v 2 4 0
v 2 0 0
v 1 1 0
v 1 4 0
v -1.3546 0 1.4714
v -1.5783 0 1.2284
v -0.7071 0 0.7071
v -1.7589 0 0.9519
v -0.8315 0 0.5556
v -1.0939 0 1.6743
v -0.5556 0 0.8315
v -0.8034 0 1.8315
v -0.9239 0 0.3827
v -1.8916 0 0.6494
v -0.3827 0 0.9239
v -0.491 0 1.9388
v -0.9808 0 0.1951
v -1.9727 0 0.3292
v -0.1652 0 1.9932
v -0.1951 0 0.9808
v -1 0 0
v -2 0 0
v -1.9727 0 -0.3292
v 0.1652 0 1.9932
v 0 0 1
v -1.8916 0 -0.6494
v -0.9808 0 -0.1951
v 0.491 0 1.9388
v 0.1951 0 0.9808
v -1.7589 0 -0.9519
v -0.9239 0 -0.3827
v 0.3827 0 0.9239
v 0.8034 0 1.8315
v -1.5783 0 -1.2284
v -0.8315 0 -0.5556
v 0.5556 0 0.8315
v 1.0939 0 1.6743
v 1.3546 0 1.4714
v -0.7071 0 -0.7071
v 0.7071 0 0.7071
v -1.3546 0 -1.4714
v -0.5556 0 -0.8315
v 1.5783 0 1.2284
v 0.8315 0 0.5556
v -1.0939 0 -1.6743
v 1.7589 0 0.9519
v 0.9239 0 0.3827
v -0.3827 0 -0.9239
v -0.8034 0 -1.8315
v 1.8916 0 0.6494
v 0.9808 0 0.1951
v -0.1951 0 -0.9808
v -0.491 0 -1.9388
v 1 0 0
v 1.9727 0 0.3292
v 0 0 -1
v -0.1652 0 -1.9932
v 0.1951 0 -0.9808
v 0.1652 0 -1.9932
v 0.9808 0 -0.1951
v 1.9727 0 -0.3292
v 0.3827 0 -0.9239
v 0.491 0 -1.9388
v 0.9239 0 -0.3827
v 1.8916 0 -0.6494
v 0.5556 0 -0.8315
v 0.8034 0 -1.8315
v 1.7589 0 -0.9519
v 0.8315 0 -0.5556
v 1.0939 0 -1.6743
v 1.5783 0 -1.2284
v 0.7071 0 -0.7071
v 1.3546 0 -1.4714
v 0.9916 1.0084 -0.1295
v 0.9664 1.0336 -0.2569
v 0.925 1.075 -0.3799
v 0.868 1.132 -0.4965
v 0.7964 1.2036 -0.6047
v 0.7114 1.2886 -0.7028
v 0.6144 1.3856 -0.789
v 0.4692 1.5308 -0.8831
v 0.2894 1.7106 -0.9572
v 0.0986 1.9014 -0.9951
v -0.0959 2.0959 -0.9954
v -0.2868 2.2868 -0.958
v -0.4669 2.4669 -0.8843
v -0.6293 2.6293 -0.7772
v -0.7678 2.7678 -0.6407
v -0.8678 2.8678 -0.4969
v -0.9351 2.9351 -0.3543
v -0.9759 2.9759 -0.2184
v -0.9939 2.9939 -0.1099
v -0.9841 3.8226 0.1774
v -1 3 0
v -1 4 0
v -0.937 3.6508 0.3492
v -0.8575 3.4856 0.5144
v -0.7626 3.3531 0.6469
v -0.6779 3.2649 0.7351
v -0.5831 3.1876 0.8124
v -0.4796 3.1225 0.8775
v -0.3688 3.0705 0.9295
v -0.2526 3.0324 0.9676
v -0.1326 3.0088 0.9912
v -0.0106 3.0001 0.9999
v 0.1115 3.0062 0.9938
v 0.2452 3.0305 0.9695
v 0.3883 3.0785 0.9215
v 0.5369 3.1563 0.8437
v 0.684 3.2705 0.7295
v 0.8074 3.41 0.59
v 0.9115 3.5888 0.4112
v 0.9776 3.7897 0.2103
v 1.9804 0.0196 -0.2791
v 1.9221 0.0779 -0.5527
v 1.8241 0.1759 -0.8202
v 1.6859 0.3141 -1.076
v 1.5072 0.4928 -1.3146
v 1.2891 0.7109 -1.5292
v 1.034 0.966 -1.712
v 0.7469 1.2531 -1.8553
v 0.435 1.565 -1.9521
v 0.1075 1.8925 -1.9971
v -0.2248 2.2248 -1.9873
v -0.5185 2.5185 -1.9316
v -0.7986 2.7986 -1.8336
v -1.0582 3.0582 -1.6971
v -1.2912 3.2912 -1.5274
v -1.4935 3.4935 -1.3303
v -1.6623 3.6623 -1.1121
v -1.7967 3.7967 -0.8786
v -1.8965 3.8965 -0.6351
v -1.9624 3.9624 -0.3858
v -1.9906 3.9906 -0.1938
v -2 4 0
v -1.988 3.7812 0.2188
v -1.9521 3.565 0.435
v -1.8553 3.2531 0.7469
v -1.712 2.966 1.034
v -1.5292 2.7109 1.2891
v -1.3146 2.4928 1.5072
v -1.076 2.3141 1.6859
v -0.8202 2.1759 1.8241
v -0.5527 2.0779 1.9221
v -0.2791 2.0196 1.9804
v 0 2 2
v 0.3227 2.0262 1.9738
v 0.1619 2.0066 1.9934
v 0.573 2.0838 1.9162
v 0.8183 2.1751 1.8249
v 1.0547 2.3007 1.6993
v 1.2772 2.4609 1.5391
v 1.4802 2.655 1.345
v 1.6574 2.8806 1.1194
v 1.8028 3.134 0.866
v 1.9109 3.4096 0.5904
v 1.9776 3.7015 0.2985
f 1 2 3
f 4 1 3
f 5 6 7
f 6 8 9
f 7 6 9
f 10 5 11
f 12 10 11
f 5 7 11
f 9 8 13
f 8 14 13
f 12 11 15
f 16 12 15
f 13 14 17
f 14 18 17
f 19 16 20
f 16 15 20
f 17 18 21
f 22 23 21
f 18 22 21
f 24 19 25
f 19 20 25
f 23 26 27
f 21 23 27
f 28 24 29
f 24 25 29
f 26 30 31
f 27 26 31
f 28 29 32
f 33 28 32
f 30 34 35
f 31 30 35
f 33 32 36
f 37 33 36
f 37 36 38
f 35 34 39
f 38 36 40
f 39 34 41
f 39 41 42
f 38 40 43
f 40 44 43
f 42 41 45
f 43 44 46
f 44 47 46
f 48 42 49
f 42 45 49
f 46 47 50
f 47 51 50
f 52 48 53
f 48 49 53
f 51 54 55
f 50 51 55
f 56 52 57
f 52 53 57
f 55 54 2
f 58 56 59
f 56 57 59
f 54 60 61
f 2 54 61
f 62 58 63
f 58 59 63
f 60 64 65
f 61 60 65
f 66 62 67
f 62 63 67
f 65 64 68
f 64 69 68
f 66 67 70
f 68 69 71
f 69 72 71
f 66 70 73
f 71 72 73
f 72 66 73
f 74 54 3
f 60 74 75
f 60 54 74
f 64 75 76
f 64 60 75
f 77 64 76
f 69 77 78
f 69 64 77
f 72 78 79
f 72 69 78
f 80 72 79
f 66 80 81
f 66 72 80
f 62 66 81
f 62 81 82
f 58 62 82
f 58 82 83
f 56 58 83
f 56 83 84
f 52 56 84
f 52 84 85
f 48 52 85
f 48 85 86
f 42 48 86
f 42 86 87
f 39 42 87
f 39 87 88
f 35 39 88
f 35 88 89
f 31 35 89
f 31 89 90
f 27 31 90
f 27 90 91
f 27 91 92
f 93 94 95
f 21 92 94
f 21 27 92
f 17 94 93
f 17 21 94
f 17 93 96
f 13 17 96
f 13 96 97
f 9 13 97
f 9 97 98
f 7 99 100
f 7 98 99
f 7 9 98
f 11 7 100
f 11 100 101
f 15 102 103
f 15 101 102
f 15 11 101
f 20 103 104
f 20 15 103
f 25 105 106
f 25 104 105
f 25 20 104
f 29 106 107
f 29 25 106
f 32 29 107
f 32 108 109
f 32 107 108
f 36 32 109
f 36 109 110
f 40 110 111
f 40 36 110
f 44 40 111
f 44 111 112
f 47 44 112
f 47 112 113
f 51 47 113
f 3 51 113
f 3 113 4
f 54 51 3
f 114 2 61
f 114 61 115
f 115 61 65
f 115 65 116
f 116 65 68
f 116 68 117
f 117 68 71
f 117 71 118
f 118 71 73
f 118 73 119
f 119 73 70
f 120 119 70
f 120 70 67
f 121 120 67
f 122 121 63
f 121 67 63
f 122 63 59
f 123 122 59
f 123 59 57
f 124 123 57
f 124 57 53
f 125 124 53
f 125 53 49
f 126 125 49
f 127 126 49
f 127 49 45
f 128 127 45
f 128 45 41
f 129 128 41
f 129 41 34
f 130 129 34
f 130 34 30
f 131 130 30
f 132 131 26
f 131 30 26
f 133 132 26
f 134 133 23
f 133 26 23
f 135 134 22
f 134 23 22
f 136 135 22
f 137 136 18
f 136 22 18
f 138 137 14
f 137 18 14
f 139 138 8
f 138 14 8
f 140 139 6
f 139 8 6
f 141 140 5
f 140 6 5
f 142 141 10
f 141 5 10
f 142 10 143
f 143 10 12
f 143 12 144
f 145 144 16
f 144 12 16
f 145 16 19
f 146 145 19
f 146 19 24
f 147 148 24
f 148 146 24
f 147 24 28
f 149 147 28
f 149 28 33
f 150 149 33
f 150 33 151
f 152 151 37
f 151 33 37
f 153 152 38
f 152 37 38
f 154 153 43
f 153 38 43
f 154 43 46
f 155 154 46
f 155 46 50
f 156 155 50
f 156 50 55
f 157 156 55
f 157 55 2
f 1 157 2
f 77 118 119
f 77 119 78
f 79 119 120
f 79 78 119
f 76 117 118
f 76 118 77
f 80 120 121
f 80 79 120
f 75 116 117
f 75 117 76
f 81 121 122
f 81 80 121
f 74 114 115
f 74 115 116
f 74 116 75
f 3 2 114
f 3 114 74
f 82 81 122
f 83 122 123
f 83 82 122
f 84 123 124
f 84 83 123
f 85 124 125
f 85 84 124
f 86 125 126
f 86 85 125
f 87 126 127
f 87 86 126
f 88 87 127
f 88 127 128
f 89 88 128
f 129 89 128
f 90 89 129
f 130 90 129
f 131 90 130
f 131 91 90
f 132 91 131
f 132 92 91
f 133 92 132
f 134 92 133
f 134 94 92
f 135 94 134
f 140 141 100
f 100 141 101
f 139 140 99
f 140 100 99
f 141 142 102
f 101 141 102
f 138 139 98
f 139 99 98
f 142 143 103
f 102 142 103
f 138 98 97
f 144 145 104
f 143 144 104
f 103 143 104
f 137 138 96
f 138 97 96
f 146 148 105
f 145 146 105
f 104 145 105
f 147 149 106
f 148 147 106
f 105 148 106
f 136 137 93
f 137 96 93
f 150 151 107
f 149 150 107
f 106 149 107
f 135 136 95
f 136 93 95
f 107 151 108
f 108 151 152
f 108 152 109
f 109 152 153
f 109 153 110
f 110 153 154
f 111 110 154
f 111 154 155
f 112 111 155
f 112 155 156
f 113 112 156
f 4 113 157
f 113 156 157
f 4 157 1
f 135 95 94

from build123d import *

# Parameters (mm, degrees)
SKETCH1_R           = 2
SKETCH1_R_2         = 1
BOSS_EXTRUDE1_DEPTH = 4
CUT_EXTRUDE1_DEPTH  = 2
CUT_EXTRUDE2_DEPTH  = 10


with BuildPart() as part:
    # Sketch1 → Boss-Extrude1 (new body)
    with BuildSketch(Plane(origin=(0, 0, 0), x_dir=(1, 0, 0), z_dir=(0, 1, 0))):
        Circle(SKETCH1_R)
        Circle(SKETCH1_R_2, mode=Mode.SUBTRACT)
    extrude(amount=BOSS_EXTRUDE1_DEPTH)

    # Sketch2 → Cut-Extrude1 (cut, symmetric)
    with BuildSketch(Plane(origin=(0, 0, 0), x_dir=(0, 0, -1), z_dir=(1, 0, 0))):
        Polygon((-2, 4), (-2, 2), (0, 4), align=None)
        Polygon((0, 4), (-2, 4), (-2, 2), align=None)
    extrude(amount=CUT_EXTRUDE1_DEPTH, both=True, mode=Mode.SUBTRACT)

    # Sketch3 → Cut-Extrude2 (cut)
    with BuildSketch(Plane.XY):
        Polygon((2, 0), (-2, 4), (2, 4), align=None)
    extrude(amount=-CUT_EXTRUDE2_DEPTH, mode=Mode.SUBTRACT)


solid = part.part
